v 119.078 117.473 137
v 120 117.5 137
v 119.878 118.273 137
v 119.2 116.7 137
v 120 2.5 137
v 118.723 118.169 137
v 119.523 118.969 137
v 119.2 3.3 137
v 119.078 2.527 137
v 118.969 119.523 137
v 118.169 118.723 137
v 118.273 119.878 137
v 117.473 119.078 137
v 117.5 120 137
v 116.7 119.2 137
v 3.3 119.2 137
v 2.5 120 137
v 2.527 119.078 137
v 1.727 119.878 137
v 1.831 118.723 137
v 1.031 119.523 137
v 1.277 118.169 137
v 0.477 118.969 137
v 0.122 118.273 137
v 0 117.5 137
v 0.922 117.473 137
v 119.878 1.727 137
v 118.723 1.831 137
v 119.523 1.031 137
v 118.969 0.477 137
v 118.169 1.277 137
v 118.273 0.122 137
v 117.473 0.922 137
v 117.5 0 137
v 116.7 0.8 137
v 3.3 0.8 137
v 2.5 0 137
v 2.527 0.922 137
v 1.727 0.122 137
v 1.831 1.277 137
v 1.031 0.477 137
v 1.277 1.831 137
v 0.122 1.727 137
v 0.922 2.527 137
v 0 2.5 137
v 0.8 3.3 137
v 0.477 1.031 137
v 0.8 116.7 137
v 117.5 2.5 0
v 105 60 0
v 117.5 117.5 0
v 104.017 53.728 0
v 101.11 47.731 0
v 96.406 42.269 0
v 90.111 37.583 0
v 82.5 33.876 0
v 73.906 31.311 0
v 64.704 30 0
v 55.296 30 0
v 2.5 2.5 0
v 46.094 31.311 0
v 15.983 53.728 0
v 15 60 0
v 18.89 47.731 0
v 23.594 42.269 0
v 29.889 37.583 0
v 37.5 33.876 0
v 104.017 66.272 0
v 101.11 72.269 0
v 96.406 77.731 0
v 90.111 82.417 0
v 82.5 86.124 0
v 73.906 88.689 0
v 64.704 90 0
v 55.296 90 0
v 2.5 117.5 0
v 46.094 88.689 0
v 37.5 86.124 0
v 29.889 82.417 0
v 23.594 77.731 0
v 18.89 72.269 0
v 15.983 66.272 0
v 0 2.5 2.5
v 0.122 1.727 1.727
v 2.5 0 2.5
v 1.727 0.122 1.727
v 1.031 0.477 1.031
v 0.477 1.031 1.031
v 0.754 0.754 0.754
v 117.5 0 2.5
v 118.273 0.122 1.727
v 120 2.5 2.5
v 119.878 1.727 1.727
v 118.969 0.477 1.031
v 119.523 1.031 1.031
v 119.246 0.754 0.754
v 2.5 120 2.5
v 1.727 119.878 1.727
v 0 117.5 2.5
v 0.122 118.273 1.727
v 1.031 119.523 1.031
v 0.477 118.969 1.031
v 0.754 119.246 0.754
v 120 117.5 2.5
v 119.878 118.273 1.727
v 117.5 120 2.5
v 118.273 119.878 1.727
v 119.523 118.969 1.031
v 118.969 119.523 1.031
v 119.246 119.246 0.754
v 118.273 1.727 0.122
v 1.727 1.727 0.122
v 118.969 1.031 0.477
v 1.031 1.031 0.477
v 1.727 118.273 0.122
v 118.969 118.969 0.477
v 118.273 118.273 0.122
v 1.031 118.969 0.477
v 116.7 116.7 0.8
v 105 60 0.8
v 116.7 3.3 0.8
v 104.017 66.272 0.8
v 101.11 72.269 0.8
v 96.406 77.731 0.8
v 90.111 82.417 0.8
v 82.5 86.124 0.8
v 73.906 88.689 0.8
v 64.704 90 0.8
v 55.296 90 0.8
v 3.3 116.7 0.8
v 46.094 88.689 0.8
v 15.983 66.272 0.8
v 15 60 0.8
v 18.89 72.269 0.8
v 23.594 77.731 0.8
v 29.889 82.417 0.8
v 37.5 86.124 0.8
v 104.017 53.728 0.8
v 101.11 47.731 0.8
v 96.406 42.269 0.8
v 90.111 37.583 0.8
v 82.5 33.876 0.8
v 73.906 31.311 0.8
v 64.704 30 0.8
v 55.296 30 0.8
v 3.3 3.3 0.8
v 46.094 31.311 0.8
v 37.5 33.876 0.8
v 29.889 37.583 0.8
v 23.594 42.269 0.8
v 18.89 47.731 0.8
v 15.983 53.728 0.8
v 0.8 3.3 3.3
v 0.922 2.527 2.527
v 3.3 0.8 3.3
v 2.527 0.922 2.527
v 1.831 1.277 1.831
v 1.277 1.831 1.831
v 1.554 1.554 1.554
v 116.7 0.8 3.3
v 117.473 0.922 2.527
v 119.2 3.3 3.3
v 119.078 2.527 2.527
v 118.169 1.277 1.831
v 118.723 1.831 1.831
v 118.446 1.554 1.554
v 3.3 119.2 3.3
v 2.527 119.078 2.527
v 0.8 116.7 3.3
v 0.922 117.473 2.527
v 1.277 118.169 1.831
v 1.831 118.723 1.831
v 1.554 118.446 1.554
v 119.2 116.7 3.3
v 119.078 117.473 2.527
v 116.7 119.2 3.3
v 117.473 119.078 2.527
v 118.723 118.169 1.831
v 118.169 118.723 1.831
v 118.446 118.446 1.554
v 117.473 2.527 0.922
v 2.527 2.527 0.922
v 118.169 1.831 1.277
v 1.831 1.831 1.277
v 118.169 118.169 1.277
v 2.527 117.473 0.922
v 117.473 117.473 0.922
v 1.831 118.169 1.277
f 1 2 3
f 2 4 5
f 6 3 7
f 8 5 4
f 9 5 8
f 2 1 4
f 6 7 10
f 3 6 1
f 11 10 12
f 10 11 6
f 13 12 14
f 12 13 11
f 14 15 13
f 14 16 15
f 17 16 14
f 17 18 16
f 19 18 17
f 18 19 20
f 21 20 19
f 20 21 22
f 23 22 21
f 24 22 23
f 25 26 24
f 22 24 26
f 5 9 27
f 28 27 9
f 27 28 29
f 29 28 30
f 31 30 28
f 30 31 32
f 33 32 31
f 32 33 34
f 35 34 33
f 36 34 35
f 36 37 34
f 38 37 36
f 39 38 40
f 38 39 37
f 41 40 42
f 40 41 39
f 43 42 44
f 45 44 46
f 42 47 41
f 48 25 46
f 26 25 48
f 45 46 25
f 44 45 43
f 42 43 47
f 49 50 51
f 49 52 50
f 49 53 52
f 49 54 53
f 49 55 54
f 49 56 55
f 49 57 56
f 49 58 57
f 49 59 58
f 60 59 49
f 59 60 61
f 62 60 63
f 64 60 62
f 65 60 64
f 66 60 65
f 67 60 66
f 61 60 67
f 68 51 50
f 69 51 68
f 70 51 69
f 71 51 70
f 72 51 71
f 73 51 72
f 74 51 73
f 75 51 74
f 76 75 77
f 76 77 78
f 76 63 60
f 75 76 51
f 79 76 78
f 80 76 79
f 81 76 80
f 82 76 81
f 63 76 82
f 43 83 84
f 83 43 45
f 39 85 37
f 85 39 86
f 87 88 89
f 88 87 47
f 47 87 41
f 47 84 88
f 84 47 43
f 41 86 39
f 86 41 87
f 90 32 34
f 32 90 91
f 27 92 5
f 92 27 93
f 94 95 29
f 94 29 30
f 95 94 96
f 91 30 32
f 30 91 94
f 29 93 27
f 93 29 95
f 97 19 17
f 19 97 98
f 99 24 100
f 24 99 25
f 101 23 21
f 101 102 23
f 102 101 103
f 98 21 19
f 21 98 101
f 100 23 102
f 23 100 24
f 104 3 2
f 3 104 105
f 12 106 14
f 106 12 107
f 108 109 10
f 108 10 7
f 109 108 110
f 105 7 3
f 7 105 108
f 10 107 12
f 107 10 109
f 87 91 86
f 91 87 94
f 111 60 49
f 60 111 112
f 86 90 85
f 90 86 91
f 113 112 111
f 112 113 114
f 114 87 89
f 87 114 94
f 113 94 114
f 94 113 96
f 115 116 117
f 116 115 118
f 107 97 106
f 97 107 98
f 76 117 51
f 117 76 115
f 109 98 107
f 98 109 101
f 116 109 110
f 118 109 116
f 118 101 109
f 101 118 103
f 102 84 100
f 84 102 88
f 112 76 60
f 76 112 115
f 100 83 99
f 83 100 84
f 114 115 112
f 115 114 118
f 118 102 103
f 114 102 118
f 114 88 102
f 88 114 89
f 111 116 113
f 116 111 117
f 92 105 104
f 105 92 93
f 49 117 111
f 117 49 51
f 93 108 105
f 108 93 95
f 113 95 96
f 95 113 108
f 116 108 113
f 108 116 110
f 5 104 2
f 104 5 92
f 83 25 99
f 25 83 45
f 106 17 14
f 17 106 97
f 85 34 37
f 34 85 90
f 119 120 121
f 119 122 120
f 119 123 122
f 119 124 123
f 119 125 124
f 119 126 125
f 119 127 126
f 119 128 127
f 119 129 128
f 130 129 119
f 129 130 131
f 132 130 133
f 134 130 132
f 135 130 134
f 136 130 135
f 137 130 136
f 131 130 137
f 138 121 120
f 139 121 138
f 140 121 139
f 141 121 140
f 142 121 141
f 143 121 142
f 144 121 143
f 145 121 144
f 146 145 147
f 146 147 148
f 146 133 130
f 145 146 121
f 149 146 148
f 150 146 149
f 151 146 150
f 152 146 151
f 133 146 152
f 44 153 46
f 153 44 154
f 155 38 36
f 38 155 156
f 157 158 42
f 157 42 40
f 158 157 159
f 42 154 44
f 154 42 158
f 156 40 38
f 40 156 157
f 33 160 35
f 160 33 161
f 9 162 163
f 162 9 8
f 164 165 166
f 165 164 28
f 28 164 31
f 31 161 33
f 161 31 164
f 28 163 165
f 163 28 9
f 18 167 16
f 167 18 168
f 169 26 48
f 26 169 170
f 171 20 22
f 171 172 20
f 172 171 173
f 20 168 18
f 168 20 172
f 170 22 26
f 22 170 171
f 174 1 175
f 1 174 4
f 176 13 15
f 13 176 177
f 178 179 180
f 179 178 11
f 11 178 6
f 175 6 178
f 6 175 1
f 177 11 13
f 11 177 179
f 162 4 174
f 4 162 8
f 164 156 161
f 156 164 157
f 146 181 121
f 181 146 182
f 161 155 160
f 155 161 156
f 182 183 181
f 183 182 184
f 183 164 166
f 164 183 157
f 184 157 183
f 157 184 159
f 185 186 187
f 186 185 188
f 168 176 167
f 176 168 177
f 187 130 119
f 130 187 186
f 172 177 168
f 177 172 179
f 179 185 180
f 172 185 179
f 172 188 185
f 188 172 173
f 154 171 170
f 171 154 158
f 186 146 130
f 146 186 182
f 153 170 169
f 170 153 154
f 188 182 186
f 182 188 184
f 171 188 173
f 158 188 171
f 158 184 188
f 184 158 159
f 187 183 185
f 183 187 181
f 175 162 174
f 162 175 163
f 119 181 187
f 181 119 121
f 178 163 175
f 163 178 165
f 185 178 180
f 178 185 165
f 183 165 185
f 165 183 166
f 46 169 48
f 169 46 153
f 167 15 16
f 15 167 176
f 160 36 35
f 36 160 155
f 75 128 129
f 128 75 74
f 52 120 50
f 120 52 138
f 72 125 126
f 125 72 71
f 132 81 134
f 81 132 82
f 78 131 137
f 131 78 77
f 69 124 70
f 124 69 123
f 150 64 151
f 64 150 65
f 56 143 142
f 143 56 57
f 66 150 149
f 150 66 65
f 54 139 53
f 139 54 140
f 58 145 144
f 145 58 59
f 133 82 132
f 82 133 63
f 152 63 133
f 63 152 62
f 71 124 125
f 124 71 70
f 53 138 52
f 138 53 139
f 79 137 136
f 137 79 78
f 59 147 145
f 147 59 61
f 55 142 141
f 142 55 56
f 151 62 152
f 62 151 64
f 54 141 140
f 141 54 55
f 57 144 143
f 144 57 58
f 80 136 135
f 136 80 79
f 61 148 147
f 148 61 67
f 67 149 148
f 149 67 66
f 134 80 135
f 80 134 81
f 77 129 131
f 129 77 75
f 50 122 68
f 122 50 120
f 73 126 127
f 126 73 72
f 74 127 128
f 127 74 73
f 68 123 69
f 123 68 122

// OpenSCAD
// Tissue Box
// Joe Wingbermuehle
// 2018-03-18

box_height = 137;
box_width = 120;
corner_size = 5;
opening_width = box_width * 0.75;
opening_height = box_width * 0.5;
wall_width = 0.8;

module corner(size, height) {
    difference() {
        translate([0, 0, height / 2]) {
            cube([size, size, height], center = true);
        }
        translate([size / 2, size / 2, height / 2]) {
            cylinder(height, size / 2, size / 2, center = true, $fn = 20);
        }
    }
}

module rounded_cube(x, y, z) {
    difference() {
        cube([x, y, z]);
        corner(corner_size, z);
        translate([x, 0, 0]) {
            rotate([0, 0, 90]) {
                corner(corner_size, z);
            }
        }
        translate([0, y, 0]) {
            rotate([0, 0, -90]) {
                corner(corner_size, z);
            }
        }
        translate([x, y, 0]) {
            rotate([0, 0, 180]) {
                corner(corner_size, z);
            }
        }
        rotate([0, 90, 0]) {
            rotate([0, 0, 90]) {
                corner(corner_size, x);
            }
        }
        translate([0, y, 0]) {
            rotate([0, 90, 0]) {
                rotate([0, 0, 180]) {
                    corner(corner_size, x);
                }
            }
        }
        translate([0, y, 0]) {
            rotate([90, 0, 0]) {
                corner(corner_size, y);
            }
        }
        translate([x, y, 0]) {
            rotate([90, 0, 0]) {
                rotate([0, 0, 90]) {
                    corner(corner_size, y);
                }
            }
        }
    }
}

module opening() {
    linear_extrude(wall_width * 2) {
        resize([opening_width, opening_height]) {
            circle(box_width);
        }   
    }
}

difference() {
    rounded_cube(box_width, box_width, box_height);
    translate([box_width / 2, box_width / 2, 0]) {
        opening();
    }
    translate([wall_width, wall_width, wall_width]) {
        rounded_cube(
            box_width - wall_width * 2,
            box_width - wall_width * 2,
            box_height);
    }
}
